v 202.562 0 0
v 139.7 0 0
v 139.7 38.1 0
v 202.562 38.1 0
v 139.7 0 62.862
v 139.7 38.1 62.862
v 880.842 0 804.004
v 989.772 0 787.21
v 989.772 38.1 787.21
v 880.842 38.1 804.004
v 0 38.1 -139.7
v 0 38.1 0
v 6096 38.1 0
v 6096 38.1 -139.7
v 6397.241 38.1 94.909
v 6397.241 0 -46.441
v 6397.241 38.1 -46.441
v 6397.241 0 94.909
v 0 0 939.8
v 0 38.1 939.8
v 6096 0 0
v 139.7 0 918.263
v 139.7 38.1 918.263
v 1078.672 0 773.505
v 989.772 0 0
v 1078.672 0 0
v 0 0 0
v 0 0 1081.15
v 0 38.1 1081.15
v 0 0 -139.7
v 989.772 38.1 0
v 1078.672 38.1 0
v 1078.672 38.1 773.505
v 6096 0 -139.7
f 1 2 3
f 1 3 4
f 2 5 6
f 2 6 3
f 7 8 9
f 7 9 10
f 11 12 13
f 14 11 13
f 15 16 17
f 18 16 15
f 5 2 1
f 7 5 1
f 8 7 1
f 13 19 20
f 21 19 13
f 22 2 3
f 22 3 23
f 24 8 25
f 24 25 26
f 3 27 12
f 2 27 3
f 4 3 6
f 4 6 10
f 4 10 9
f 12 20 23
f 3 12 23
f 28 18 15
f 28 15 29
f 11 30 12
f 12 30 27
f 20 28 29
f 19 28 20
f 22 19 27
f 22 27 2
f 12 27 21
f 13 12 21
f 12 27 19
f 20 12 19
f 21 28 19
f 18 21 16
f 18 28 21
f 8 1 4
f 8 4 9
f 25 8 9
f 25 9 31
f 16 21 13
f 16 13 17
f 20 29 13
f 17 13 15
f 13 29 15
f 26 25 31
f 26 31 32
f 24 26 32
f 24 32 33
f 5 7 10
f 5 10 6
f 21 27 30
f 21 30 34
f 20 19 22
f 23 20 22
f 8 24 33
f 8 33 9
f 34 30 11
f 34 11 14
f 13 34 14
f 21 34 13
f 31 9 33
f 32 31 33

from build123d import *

# Parameters (mm, degrees)
F0_W      = 139.7
F0_H      = 939.8
F1_DEPTH  = 38.1
F2_W      = 6096
F2_H      = 139.7
F3_DEPTH  = 38.1
F5_DEPTH  = 38.101
F7_DEPTH  = 38.1
F9_DEPTH  = 38.1
F11_DEPTH = 38.1


with BuildPart() as f1:
    # F0 (on Front) → F1 (new body)
    with BuildSketch(Plane.XZ):
        with Locations((69.85, 469.9)):
            Rectangle(F0_W, F0_H)
    extrude(amount=-F1_DEPTH)

    # F4 (on face) → F5 (cut, through all)
    with BuildSketch(Plane.XZ):
        Polygon((139.7, 939.8), (0, 939.8), (139.7, 918.262917), align=None)
    extrude(amount=-F5_DEPTH, mode=Mode.SUBTRACT)


with BuildPart() as f3:
    # F2 (on face) → F3 (new body, through all)
    with BuildSketch(Plane.XZ):
        with Locations((3048, -69.85)):
            Rectangle(F2_W, F2_H)
    extrude(amount=-F3_DEPTH)


with BuildPart() as f7:
    # F6 (on face) → F7 (new body)
    with BuildSketch(Plane.XZ):
        Polygon((0, 1081.150401), (0, 939.8), (6096, 0), (6397.241168, -46.441347), (6397.241168, 94.909055), align=None)
    extrude(amount=-F7_DEPTH)


with BuildPart() as f9:
    # F8 (on face) → F9 (new body)
    with BuildSketch(Plane.XZ):
        Polygon((139.7, 0), (202.561793, 0), (989.77195, 787.210158), (880.841768, 804.003561), (139.7, 62.861793), align=None)
    extrude(amount=-F9_DEPTH)


with BuildPart() as f11:
    # F10 (on face) → F11 (new body)
    with BuildSketch(Plane.XZ):
        Polygon((1078.67195, 773.504741), (989.77195, 787.210158), (989.77195, 0), (1078.67195, 0), align=None)
    extrude(amount=-F11_DEPTH)


solid = Compound([f1.part, f3.part, f7.part, f9.part, f11.part])
